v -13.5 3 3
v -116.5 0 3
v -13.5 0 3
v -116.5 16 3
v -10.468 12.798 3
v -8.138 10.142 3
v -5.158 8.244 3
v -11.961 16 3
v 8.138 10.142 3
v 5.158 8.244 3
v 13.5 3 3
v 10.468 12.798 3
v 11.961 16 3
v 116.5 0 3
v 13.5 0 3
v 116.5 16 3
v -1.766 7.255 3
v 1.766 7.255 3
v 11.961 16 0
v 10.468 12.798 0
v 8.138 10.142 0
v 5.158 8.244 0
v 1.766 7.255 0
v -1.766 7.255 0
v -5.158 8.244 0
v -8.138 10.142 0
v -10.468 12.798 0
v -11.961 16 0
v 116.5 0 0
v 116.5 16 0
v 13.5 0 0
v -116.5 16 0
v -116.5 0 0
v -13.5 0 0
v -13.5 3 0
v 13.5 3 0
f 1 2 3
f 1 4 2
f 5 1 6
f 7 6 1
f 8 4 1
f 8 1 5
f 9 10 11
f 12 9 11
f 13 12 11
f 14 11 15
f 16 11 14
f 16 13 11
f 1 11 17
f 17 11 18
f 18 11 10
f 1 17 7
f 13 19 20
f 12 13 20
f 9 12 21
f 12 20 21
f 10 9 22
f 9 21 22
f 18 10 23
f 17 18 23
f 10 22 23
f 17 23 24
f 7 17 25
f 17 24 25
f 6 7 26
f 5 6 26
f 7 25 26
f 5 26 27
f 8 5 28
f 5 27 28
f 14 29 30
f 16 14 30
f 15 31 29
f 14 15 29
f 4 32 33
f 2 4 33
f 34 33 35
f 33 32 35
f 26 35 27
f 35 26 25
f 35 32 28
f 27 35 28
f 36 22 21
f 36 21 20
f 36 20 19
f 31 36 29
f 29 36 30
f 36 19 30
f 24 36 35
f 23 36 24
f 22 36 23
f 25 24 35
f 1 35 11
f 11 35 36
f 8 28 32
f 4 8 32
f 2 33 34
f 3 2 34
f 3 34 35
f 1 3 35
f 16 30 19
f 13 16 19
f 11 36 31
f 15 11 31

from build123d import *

# Parameters (mm, degrees)
P_IDAT_VYSUNUT_M1_DEPTH = 3


with BuildPart() as part:
    # Skica1 → Přidat vysunutím1 (new body)
    with BuildSketch(Plane.XY):
        with BuildLine():
            Line((-116.5, 0), (-13.5, 0))
            Line((-13.5, 0), (-13.5, 3))
            Line((-13.5, 3), (13.5, 3))
            Line((13.5, 3), (13.5, 0))
            Line((13.5, 0), (116.5, 0))
            Line((116.5, 0), (116.5, 16))
            Line((116.5, 16), (53.5, 16))
            Line((53.5, 16), (11.961316817, 16))
            ThreePointArc((11.961316817, 16), (0, 7.13), (-11.961316817, 16))
            Line((-11.961316817, 16), (-53.5, 16))
            Line((-53.5, 16), (-116.5, 16))
            Line((-116.5, 16), (-116.5, 0))
        make_face()
    extrude(amount=P_IDAT_VYSUNUT_M1_DEPTH)


solid = part.part
